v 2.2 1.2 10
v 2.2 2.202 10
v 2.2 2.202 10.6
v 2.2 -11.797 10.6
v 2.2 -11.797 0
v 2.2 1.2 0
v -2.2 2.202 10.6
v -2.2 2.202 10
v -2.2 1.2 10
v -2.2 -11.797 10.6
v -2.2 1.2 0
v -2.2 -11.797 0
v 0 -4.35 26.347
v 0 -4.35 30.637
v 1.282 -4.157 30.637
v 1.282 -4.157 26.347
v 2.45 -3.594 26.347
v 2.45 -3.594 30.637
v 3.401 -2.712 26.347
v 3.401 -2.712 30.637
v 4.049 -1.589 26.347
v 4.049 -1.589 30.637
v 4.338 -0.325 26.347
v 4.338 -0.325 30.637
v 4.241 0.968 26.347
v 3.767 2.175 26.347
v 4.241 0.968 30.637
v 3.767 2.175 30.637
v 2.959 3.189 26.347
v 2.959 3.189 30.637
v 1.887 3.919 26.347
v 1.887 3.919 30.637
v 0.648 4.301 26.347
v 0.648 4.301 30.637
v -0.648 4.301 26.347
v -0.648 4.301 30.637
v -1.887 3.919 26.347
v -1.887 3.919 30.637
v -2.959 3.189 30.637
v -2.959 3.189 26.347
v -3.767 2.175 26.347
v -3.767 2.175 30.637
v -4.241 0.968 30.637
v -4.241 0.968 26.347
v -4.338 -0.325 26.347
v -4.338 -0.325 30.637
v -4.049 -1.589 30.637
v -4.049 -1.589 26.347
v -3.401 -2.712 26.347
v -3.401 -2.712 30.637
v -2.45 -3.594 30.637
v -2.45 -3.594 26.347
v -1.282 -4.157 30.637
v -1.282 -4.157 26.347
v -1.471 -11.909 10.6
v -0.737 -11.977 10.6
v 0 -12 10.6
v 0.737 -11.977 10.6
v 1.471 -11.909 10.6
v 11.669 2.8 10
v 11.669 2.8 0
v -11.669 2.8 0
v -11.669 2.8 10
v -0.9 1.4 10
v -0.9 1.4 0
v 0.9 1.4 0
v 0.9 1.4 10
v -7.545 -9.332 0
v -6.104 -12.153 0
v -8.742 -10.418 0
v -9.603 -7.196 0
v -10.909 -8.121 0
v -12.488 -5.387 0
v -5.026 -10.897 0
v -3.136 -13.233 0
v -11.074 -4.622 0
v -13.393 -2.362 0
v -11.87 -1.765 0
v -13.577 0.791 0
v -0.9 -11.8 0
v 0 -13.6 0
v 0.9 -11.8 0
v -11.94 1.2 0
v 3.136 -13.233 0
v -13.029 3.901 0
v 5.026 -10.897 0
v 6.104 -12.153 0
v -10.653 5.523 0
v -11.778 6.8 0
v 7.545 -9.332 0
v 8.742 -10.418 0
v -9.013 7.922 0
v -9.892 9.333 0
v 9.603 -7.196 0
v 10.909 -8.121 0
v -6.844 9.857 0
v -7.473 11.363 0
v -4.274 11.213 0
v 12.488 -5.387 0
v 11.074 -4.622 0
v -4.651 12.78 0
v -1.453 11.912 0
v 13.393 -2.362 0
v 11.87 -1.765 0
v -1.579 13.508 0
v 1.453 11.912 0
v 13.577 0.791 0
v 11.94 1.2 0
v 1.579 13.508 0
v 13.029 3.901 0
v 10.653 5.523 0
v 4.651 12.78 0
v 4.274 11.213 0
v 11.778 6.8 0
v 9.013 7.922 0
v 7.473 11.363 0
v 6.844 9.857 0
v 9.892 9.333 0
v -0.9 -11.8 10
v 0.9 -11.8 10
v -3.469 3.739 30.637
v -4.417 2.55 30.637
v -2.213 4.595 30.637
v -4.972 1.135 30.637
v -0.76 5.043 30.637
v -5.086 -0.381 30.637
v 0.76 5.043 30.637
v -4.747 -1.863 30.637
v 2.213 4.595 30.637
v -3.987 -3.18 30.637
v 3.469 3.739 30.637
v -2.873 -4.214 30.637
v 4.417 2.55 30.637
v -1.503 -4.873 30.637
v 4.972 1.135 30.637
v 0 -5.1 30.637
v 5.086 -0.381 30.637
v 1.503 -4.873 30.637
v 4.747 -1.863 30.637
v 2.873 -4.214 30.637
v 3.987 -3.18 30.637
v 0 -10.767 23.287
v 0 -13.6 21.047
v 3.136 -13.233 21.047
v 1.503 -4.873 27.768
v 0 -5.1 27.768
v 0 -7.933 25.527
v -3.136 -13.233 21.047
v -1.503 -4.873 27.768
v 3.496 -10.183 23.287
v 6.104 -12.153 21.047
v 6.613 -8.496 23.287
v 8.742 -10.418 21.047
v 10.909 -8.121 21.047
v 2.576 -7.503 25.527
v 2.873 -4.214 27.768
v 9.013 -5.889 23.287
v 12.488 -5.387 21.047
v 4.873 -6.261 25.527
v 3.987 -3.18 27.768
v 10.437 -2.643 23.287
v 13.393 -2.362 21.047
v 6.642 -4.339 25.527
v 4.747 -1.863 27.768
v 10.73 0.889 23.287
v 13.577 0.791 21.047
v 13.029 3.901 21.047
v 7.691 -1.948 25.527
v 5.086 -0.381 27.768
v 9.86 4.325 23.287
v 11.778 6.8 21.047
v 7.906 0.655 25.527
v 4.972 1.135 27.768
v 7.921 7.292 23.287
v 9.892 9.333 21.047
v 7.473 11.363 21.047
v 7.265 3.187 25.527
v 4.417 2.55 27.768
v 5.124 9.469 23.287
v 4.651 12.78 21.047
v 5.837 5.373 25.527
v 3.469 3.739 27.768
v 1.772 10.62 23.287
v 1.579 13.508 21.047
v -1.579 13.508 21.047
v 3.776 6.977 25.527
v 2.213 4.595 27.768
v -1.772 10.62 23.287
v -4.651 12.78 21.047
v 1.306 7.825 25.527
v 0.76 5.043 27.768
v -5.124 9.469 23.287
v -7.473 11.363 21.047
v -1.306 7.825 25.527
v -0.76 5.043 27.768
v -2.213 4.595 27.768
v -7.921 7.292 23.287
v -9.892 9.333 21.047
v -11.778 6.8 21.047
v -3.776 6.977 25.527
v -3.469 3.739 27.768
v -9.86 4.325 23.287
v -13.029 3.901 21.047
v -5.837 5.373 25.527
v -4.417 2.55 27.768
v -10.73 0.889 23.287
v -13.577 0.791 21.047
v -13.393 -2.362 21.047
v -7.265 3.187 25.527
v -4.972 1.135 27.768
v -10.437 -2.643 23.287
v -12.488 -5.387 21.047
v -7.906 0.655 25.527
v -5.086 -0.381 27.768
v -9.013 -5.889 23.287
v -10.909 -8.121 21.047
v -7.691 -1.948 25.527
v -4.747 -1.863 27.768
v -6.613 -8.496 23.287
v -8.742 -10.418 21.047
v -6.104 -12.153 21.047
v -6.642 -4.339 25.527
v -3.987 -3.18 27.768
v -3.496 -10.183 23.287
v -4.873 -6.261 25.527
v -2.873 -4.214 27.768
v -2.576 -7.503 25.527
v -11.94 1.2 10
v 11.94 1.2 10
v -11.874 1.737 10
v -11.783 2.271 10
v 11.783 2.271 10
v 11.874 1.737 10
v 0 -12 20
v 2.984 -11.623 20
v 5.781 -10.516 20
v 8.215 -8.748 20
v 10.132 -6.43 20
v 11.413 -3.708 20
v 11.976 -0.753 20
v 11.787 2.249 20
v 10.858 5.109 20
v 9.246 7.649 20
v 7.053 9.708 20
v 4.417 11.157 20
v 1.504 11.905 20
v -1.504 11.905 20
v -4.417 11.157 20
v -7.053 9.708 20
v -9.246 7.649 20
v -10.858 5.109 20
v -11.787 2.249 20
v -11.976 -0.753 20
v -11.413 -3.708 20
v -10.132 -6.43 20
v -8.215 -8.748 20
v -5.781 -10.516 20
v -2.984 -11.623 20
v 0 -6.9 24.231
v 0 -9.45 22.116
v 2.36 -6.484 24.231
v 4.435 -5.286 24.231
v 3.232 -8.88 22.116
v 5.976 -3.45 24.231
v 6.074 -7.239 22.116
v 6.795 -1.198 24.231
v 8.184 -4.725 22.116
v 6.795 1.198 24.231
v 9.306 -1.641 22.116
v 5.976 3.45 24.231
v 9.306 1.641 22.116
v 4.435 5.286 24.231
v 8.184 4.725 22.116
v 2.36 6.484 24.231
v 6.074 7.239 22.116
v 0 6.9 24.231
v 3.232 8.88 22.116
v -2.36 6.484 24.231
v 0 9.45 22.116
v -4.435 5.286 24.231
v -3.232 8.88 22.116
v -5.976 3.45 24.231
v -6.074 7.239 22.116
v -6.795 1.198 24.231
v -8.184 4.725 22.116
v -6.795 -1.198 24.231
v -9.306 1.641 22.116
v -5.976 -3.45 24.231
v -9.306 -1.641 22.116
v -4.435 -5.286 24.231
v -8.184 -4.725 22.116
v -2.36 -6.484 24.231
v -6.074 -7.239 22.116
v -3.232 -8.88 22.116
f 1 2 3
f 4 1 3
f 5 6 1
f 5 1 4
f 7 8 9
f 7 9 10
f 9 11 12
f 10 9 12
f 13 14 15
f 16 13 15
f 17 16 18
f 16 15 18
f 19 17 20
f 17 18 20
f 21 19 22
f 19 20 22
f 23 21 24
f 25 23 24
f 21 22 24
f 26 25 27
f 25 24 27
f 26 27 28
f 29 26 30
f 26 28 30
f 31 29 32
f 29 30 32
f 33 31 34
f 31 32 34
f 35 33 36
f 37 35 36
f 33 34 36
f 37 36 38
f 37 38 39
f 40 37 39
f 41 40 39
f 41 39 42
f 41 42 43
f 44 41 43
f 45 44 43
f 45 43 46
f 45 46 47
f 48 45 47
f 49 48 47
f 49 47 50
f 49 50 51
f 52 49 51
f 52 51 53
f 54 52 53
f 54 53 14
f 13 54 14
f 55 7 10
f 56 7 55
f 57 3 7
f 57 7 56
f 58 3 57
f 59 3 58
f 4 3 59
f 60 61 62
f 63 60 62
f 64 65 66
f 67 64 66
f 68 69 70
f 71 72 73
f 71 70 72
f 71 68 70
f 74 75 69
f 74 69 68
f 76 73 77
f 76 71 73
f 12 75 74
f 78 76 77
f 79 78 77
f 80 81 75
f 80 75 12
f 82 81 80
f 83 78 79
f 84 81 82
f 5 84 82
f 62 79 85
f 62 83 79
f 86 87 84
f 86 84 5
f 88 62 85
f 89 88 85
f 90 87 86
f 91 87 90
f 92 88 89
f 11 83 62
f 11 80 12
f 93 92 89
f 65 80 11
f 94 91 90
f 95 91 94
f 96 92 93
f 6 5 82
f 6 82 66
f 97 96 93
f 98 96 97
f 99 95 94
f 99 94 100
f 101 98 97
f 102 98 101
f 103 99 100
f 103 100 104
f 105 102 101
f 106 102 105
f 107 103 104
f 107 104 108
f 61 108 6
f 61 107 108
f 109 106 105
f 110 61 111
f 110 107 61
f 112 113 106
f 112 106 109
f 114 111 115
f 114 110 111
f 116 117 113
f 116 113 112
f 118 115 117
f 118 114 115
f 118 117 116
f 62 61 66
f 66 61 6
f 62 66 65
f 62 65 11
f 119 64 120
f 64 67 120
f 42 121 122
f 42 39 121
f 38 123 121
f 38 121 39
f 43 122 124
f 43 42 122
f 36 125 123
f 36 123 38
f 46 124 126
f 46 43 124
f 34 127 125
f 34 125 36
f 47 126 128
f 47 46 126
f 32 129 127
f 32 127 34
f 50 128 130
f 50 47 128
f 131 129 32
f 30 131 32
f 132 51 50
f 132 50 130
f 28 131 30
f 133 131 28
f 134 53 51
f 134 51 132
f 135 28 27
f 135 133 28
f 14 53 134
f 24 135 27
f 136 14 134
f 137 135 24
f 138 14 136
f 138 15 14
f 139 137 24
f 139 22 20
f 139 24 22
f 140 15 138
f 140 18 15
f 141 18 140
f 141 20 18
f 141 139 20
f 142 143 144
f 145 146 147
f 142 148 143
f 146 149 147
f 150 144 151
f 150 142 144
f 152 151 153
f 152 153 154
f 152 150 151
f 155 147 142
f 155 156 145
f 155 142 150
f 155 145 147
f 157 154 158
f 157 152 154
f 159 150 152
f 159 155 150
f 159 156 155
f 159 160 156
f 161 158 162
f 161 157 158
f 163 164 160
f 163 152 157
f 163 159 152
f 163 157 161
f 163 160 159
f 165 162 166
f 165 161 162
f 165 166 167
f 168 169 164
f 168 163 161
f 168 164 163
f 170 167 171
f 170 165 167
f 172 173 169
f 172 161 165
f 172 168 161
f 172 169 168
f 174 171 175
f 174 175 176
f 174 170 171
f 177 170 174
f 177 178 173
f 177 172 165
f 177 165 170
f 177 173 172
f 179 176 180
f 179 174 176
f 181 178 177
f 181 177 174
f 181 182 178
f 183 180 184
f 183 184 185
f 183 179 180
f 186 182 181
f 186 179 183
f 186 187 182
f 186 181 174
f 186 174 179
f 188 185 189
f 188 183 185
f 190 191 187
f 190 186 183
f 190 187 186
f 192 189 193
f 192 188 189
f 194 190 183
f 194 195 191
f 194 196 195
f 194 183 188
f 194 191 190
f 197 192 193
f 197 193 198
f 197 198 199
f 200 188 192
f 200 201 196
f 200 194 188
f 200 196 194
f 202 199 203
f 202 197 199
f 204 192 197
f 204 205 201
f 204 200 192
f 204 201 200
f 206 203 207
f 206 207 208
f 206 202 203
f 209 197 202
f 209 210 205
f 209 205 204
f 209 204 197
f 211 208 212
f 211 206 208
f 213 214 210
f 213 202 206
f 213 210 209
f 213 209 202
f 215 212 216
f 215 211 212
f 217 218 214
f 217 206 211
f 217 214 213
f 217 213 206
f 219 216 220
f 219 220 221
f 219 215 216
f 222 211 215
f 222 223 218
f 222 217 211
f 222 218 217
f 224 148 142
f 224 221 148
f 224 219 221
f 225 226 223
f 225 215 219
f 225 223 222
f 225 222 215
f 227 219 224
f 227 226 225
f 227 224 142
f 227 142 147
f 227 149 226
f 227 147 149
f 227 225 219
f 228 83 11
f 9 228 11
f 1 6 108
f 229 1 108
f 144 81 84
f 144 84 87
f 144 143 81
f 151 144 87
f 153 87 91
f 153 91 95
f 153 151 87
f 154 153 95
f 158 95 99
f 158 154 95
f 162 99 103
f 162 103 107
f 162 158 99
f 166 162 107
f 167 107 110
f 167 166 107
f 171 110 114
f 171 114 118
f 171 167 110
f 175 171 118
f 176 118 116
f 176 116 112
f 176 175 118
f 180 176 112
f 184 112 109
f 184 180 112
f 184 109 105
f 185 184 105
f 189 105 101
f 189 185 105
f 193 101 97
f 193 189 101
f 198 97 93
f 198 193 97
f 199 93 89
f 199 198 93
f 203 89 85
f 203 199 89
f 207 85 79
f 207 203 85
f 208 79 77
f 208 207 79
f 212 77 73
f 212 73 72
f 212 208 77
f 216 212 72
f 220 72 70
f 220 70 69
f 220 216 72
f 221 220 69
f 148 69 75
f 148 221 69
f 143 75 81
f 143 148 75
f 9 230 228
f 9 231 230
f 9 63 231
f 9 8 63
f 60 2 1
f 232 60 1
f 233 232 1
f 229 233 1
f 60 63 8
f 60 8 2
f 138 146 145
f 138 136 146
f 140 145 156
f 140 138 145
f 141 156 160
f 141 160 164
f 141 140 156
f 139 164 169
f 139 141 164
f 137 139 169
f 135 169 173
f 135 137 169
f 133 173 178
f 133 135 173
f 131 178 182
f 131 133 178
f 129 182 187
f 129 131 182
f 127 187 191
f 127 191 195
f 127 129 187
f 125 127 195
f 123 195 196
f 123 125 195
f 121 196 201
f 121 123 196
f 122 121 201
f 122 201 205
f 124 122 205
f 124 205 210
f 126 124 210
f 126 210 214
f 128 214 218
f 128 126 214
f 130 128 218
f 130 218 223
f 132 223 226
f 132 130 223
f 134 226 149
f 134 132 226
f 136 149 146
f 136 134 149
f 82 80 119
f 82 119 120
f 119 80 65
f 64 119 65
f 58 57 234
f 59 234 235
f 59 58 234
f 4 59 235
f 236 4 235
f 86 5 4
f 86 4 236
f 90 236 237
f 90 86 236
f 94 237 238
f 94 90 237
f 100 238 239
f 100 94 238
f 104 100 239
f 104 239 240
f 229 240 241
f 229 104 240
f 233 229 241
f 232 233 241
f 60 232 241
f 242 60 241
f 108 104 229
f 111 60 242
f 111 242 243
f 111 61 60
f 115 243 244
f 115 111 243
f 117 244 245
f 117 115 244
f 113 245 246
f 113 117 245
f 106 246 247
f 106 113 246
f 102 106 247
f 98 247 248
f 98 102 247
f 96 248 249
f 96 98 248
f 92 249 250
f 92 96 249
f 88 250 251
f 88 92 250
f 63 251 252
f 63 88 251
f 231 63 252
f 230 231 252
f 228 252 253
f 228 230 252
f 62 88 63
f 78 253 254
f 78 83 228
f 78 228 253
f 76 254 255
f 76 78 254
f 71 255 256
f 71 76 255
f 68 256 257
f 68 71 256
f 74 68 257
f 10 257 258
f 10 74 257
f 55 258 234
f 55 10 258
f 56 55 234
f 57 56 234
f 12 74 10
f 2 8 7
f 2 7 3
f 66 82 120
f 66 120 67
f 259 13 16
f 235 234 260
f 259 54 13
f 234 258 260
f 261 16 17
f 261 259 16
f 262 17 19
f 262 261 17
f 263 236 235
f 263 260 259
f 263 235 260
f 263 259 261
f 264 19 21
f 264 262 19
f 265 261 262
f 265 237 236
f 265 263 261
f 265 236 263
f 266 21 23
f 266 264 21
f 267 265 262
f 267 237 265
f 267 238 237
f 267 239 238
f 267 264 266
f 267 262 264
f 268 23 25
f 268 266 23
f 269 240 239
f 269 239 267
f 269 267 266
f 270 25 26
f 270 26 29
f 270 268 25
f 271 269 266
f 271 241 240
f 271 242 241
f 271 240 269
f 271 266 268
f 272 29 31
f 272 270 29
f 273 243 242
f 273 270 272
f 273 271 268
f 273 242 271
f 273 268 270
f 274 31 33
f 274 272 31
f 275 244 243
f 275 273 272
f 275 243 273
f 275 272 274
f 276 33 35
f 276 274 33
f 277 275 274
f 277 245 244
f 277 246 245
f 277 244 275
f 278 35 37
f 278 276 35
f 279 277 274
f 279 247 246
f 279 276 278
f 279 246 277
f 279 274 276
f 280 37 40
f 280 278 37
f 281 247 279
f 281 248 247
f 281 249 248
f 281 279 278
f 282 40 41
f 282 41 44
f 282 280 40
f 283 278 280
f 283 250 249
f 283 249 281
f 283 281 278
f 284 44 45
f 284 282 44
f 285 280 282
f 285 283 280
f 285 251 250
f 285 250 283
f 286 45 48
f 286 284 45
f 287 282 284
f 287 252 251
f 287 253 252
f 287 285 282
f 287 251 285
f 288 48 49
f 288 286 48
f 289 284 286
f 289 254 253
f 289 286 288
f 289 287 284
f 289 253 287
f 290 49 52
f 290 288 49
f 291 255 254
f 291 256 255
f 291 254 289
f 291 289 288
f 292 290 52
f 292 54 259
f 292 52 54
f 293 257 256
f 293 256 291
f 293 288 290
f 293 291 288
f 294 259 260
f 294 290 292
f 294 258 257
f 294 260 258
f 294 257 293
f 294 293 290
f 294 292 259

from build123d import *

# Parameters (mm, degrees)
PAD003_DEPTH    = 10
SKETCH008_W     = 13.2
SKETCH008_H     = 1.8
POCKET005_DEPTH = 10
SKETCH011_R     = 5.1
PAD005_DEPTH    = 2
SKETCH012_R     = 4.35
POCKET006_DEPTH = 6
SKETCH013_W     = 15.4
SKETCH013_H     = 4.4
PAD006_DEPTH    = 0.6


with BuildPart() as part:
    # Sketch006 → Revolution (revolve)
    with BuildSketch(Plane.YZ):
        Polygon((-4, 26.637276), (-12, 20), (-12, 0), (-13.6, 0), (-13.6, 21.046803), (-4, 28.637276), (0, 28.637276), (0, 26.637276), align=None)
    revolve(axis=Axis((0, 0, 0), (0, 0, 1)))

    # Sketch007 (on Face3 of Revolution) → Pad003 (new body)
    with BuildSketch(Plane.YX):
        Polygon((-12.6, 2.2), (1.2, 2.2), (1.2, 12.3), (2.8, 12.3), (2.8, -12.3), (1.2, -12.3), (1.2, -2.2), (-12.6, -2.2), align=None)
    extrude(amount=-PAD003_DEPTH)

    # Sketch008 → Pocket005 (cut)
    with BuildSketch(Plane.YX):
        with Locations((-5.2, 0)):
            Rectangle(SKETCH008_W, SKETCH008_H)
    extrude(amount=-POCKET005_DEPTH, mode=Mode.SUBTRACT)

    # Sketch011 → Pad005 (join, symmetric)
    with BuildSketch(Plane(origin=(0, 0, 28.637276), x_dir=(0, -1, 0), z_dir=(0, 0, 1))):
        Circle(SKETCH011_R)
    extrude(amount=PAD005_DEPTH, both=True)

    # Sketch012 (on Face22 of Pad005) → Pocket006 (cut)
    with BuildSketch(Plane(origin=(0, 0, 30.637276), x_dir=(0, -1, 0), z_dir=(0, 0, 1))):
        Circle(SKETCH012_R)
    extrude(amount=-POCKET006_DEPTH, mode=Mode.SUBTRACT)

    # Sketch013 (on Face5 of Pocket006) → Pad006 (join)
    with BuildSketch(Plane(origin=(0, 0, 10), x_dir=(0, -1, 0), z_dir=(0, 0, 1))):
        with Locations((5.497757, 0)):
            Rectangle(SKETCH013_W, SKETCH013_H)
    extrude(amount=PAD006_DEPTH)


solid = part.part
